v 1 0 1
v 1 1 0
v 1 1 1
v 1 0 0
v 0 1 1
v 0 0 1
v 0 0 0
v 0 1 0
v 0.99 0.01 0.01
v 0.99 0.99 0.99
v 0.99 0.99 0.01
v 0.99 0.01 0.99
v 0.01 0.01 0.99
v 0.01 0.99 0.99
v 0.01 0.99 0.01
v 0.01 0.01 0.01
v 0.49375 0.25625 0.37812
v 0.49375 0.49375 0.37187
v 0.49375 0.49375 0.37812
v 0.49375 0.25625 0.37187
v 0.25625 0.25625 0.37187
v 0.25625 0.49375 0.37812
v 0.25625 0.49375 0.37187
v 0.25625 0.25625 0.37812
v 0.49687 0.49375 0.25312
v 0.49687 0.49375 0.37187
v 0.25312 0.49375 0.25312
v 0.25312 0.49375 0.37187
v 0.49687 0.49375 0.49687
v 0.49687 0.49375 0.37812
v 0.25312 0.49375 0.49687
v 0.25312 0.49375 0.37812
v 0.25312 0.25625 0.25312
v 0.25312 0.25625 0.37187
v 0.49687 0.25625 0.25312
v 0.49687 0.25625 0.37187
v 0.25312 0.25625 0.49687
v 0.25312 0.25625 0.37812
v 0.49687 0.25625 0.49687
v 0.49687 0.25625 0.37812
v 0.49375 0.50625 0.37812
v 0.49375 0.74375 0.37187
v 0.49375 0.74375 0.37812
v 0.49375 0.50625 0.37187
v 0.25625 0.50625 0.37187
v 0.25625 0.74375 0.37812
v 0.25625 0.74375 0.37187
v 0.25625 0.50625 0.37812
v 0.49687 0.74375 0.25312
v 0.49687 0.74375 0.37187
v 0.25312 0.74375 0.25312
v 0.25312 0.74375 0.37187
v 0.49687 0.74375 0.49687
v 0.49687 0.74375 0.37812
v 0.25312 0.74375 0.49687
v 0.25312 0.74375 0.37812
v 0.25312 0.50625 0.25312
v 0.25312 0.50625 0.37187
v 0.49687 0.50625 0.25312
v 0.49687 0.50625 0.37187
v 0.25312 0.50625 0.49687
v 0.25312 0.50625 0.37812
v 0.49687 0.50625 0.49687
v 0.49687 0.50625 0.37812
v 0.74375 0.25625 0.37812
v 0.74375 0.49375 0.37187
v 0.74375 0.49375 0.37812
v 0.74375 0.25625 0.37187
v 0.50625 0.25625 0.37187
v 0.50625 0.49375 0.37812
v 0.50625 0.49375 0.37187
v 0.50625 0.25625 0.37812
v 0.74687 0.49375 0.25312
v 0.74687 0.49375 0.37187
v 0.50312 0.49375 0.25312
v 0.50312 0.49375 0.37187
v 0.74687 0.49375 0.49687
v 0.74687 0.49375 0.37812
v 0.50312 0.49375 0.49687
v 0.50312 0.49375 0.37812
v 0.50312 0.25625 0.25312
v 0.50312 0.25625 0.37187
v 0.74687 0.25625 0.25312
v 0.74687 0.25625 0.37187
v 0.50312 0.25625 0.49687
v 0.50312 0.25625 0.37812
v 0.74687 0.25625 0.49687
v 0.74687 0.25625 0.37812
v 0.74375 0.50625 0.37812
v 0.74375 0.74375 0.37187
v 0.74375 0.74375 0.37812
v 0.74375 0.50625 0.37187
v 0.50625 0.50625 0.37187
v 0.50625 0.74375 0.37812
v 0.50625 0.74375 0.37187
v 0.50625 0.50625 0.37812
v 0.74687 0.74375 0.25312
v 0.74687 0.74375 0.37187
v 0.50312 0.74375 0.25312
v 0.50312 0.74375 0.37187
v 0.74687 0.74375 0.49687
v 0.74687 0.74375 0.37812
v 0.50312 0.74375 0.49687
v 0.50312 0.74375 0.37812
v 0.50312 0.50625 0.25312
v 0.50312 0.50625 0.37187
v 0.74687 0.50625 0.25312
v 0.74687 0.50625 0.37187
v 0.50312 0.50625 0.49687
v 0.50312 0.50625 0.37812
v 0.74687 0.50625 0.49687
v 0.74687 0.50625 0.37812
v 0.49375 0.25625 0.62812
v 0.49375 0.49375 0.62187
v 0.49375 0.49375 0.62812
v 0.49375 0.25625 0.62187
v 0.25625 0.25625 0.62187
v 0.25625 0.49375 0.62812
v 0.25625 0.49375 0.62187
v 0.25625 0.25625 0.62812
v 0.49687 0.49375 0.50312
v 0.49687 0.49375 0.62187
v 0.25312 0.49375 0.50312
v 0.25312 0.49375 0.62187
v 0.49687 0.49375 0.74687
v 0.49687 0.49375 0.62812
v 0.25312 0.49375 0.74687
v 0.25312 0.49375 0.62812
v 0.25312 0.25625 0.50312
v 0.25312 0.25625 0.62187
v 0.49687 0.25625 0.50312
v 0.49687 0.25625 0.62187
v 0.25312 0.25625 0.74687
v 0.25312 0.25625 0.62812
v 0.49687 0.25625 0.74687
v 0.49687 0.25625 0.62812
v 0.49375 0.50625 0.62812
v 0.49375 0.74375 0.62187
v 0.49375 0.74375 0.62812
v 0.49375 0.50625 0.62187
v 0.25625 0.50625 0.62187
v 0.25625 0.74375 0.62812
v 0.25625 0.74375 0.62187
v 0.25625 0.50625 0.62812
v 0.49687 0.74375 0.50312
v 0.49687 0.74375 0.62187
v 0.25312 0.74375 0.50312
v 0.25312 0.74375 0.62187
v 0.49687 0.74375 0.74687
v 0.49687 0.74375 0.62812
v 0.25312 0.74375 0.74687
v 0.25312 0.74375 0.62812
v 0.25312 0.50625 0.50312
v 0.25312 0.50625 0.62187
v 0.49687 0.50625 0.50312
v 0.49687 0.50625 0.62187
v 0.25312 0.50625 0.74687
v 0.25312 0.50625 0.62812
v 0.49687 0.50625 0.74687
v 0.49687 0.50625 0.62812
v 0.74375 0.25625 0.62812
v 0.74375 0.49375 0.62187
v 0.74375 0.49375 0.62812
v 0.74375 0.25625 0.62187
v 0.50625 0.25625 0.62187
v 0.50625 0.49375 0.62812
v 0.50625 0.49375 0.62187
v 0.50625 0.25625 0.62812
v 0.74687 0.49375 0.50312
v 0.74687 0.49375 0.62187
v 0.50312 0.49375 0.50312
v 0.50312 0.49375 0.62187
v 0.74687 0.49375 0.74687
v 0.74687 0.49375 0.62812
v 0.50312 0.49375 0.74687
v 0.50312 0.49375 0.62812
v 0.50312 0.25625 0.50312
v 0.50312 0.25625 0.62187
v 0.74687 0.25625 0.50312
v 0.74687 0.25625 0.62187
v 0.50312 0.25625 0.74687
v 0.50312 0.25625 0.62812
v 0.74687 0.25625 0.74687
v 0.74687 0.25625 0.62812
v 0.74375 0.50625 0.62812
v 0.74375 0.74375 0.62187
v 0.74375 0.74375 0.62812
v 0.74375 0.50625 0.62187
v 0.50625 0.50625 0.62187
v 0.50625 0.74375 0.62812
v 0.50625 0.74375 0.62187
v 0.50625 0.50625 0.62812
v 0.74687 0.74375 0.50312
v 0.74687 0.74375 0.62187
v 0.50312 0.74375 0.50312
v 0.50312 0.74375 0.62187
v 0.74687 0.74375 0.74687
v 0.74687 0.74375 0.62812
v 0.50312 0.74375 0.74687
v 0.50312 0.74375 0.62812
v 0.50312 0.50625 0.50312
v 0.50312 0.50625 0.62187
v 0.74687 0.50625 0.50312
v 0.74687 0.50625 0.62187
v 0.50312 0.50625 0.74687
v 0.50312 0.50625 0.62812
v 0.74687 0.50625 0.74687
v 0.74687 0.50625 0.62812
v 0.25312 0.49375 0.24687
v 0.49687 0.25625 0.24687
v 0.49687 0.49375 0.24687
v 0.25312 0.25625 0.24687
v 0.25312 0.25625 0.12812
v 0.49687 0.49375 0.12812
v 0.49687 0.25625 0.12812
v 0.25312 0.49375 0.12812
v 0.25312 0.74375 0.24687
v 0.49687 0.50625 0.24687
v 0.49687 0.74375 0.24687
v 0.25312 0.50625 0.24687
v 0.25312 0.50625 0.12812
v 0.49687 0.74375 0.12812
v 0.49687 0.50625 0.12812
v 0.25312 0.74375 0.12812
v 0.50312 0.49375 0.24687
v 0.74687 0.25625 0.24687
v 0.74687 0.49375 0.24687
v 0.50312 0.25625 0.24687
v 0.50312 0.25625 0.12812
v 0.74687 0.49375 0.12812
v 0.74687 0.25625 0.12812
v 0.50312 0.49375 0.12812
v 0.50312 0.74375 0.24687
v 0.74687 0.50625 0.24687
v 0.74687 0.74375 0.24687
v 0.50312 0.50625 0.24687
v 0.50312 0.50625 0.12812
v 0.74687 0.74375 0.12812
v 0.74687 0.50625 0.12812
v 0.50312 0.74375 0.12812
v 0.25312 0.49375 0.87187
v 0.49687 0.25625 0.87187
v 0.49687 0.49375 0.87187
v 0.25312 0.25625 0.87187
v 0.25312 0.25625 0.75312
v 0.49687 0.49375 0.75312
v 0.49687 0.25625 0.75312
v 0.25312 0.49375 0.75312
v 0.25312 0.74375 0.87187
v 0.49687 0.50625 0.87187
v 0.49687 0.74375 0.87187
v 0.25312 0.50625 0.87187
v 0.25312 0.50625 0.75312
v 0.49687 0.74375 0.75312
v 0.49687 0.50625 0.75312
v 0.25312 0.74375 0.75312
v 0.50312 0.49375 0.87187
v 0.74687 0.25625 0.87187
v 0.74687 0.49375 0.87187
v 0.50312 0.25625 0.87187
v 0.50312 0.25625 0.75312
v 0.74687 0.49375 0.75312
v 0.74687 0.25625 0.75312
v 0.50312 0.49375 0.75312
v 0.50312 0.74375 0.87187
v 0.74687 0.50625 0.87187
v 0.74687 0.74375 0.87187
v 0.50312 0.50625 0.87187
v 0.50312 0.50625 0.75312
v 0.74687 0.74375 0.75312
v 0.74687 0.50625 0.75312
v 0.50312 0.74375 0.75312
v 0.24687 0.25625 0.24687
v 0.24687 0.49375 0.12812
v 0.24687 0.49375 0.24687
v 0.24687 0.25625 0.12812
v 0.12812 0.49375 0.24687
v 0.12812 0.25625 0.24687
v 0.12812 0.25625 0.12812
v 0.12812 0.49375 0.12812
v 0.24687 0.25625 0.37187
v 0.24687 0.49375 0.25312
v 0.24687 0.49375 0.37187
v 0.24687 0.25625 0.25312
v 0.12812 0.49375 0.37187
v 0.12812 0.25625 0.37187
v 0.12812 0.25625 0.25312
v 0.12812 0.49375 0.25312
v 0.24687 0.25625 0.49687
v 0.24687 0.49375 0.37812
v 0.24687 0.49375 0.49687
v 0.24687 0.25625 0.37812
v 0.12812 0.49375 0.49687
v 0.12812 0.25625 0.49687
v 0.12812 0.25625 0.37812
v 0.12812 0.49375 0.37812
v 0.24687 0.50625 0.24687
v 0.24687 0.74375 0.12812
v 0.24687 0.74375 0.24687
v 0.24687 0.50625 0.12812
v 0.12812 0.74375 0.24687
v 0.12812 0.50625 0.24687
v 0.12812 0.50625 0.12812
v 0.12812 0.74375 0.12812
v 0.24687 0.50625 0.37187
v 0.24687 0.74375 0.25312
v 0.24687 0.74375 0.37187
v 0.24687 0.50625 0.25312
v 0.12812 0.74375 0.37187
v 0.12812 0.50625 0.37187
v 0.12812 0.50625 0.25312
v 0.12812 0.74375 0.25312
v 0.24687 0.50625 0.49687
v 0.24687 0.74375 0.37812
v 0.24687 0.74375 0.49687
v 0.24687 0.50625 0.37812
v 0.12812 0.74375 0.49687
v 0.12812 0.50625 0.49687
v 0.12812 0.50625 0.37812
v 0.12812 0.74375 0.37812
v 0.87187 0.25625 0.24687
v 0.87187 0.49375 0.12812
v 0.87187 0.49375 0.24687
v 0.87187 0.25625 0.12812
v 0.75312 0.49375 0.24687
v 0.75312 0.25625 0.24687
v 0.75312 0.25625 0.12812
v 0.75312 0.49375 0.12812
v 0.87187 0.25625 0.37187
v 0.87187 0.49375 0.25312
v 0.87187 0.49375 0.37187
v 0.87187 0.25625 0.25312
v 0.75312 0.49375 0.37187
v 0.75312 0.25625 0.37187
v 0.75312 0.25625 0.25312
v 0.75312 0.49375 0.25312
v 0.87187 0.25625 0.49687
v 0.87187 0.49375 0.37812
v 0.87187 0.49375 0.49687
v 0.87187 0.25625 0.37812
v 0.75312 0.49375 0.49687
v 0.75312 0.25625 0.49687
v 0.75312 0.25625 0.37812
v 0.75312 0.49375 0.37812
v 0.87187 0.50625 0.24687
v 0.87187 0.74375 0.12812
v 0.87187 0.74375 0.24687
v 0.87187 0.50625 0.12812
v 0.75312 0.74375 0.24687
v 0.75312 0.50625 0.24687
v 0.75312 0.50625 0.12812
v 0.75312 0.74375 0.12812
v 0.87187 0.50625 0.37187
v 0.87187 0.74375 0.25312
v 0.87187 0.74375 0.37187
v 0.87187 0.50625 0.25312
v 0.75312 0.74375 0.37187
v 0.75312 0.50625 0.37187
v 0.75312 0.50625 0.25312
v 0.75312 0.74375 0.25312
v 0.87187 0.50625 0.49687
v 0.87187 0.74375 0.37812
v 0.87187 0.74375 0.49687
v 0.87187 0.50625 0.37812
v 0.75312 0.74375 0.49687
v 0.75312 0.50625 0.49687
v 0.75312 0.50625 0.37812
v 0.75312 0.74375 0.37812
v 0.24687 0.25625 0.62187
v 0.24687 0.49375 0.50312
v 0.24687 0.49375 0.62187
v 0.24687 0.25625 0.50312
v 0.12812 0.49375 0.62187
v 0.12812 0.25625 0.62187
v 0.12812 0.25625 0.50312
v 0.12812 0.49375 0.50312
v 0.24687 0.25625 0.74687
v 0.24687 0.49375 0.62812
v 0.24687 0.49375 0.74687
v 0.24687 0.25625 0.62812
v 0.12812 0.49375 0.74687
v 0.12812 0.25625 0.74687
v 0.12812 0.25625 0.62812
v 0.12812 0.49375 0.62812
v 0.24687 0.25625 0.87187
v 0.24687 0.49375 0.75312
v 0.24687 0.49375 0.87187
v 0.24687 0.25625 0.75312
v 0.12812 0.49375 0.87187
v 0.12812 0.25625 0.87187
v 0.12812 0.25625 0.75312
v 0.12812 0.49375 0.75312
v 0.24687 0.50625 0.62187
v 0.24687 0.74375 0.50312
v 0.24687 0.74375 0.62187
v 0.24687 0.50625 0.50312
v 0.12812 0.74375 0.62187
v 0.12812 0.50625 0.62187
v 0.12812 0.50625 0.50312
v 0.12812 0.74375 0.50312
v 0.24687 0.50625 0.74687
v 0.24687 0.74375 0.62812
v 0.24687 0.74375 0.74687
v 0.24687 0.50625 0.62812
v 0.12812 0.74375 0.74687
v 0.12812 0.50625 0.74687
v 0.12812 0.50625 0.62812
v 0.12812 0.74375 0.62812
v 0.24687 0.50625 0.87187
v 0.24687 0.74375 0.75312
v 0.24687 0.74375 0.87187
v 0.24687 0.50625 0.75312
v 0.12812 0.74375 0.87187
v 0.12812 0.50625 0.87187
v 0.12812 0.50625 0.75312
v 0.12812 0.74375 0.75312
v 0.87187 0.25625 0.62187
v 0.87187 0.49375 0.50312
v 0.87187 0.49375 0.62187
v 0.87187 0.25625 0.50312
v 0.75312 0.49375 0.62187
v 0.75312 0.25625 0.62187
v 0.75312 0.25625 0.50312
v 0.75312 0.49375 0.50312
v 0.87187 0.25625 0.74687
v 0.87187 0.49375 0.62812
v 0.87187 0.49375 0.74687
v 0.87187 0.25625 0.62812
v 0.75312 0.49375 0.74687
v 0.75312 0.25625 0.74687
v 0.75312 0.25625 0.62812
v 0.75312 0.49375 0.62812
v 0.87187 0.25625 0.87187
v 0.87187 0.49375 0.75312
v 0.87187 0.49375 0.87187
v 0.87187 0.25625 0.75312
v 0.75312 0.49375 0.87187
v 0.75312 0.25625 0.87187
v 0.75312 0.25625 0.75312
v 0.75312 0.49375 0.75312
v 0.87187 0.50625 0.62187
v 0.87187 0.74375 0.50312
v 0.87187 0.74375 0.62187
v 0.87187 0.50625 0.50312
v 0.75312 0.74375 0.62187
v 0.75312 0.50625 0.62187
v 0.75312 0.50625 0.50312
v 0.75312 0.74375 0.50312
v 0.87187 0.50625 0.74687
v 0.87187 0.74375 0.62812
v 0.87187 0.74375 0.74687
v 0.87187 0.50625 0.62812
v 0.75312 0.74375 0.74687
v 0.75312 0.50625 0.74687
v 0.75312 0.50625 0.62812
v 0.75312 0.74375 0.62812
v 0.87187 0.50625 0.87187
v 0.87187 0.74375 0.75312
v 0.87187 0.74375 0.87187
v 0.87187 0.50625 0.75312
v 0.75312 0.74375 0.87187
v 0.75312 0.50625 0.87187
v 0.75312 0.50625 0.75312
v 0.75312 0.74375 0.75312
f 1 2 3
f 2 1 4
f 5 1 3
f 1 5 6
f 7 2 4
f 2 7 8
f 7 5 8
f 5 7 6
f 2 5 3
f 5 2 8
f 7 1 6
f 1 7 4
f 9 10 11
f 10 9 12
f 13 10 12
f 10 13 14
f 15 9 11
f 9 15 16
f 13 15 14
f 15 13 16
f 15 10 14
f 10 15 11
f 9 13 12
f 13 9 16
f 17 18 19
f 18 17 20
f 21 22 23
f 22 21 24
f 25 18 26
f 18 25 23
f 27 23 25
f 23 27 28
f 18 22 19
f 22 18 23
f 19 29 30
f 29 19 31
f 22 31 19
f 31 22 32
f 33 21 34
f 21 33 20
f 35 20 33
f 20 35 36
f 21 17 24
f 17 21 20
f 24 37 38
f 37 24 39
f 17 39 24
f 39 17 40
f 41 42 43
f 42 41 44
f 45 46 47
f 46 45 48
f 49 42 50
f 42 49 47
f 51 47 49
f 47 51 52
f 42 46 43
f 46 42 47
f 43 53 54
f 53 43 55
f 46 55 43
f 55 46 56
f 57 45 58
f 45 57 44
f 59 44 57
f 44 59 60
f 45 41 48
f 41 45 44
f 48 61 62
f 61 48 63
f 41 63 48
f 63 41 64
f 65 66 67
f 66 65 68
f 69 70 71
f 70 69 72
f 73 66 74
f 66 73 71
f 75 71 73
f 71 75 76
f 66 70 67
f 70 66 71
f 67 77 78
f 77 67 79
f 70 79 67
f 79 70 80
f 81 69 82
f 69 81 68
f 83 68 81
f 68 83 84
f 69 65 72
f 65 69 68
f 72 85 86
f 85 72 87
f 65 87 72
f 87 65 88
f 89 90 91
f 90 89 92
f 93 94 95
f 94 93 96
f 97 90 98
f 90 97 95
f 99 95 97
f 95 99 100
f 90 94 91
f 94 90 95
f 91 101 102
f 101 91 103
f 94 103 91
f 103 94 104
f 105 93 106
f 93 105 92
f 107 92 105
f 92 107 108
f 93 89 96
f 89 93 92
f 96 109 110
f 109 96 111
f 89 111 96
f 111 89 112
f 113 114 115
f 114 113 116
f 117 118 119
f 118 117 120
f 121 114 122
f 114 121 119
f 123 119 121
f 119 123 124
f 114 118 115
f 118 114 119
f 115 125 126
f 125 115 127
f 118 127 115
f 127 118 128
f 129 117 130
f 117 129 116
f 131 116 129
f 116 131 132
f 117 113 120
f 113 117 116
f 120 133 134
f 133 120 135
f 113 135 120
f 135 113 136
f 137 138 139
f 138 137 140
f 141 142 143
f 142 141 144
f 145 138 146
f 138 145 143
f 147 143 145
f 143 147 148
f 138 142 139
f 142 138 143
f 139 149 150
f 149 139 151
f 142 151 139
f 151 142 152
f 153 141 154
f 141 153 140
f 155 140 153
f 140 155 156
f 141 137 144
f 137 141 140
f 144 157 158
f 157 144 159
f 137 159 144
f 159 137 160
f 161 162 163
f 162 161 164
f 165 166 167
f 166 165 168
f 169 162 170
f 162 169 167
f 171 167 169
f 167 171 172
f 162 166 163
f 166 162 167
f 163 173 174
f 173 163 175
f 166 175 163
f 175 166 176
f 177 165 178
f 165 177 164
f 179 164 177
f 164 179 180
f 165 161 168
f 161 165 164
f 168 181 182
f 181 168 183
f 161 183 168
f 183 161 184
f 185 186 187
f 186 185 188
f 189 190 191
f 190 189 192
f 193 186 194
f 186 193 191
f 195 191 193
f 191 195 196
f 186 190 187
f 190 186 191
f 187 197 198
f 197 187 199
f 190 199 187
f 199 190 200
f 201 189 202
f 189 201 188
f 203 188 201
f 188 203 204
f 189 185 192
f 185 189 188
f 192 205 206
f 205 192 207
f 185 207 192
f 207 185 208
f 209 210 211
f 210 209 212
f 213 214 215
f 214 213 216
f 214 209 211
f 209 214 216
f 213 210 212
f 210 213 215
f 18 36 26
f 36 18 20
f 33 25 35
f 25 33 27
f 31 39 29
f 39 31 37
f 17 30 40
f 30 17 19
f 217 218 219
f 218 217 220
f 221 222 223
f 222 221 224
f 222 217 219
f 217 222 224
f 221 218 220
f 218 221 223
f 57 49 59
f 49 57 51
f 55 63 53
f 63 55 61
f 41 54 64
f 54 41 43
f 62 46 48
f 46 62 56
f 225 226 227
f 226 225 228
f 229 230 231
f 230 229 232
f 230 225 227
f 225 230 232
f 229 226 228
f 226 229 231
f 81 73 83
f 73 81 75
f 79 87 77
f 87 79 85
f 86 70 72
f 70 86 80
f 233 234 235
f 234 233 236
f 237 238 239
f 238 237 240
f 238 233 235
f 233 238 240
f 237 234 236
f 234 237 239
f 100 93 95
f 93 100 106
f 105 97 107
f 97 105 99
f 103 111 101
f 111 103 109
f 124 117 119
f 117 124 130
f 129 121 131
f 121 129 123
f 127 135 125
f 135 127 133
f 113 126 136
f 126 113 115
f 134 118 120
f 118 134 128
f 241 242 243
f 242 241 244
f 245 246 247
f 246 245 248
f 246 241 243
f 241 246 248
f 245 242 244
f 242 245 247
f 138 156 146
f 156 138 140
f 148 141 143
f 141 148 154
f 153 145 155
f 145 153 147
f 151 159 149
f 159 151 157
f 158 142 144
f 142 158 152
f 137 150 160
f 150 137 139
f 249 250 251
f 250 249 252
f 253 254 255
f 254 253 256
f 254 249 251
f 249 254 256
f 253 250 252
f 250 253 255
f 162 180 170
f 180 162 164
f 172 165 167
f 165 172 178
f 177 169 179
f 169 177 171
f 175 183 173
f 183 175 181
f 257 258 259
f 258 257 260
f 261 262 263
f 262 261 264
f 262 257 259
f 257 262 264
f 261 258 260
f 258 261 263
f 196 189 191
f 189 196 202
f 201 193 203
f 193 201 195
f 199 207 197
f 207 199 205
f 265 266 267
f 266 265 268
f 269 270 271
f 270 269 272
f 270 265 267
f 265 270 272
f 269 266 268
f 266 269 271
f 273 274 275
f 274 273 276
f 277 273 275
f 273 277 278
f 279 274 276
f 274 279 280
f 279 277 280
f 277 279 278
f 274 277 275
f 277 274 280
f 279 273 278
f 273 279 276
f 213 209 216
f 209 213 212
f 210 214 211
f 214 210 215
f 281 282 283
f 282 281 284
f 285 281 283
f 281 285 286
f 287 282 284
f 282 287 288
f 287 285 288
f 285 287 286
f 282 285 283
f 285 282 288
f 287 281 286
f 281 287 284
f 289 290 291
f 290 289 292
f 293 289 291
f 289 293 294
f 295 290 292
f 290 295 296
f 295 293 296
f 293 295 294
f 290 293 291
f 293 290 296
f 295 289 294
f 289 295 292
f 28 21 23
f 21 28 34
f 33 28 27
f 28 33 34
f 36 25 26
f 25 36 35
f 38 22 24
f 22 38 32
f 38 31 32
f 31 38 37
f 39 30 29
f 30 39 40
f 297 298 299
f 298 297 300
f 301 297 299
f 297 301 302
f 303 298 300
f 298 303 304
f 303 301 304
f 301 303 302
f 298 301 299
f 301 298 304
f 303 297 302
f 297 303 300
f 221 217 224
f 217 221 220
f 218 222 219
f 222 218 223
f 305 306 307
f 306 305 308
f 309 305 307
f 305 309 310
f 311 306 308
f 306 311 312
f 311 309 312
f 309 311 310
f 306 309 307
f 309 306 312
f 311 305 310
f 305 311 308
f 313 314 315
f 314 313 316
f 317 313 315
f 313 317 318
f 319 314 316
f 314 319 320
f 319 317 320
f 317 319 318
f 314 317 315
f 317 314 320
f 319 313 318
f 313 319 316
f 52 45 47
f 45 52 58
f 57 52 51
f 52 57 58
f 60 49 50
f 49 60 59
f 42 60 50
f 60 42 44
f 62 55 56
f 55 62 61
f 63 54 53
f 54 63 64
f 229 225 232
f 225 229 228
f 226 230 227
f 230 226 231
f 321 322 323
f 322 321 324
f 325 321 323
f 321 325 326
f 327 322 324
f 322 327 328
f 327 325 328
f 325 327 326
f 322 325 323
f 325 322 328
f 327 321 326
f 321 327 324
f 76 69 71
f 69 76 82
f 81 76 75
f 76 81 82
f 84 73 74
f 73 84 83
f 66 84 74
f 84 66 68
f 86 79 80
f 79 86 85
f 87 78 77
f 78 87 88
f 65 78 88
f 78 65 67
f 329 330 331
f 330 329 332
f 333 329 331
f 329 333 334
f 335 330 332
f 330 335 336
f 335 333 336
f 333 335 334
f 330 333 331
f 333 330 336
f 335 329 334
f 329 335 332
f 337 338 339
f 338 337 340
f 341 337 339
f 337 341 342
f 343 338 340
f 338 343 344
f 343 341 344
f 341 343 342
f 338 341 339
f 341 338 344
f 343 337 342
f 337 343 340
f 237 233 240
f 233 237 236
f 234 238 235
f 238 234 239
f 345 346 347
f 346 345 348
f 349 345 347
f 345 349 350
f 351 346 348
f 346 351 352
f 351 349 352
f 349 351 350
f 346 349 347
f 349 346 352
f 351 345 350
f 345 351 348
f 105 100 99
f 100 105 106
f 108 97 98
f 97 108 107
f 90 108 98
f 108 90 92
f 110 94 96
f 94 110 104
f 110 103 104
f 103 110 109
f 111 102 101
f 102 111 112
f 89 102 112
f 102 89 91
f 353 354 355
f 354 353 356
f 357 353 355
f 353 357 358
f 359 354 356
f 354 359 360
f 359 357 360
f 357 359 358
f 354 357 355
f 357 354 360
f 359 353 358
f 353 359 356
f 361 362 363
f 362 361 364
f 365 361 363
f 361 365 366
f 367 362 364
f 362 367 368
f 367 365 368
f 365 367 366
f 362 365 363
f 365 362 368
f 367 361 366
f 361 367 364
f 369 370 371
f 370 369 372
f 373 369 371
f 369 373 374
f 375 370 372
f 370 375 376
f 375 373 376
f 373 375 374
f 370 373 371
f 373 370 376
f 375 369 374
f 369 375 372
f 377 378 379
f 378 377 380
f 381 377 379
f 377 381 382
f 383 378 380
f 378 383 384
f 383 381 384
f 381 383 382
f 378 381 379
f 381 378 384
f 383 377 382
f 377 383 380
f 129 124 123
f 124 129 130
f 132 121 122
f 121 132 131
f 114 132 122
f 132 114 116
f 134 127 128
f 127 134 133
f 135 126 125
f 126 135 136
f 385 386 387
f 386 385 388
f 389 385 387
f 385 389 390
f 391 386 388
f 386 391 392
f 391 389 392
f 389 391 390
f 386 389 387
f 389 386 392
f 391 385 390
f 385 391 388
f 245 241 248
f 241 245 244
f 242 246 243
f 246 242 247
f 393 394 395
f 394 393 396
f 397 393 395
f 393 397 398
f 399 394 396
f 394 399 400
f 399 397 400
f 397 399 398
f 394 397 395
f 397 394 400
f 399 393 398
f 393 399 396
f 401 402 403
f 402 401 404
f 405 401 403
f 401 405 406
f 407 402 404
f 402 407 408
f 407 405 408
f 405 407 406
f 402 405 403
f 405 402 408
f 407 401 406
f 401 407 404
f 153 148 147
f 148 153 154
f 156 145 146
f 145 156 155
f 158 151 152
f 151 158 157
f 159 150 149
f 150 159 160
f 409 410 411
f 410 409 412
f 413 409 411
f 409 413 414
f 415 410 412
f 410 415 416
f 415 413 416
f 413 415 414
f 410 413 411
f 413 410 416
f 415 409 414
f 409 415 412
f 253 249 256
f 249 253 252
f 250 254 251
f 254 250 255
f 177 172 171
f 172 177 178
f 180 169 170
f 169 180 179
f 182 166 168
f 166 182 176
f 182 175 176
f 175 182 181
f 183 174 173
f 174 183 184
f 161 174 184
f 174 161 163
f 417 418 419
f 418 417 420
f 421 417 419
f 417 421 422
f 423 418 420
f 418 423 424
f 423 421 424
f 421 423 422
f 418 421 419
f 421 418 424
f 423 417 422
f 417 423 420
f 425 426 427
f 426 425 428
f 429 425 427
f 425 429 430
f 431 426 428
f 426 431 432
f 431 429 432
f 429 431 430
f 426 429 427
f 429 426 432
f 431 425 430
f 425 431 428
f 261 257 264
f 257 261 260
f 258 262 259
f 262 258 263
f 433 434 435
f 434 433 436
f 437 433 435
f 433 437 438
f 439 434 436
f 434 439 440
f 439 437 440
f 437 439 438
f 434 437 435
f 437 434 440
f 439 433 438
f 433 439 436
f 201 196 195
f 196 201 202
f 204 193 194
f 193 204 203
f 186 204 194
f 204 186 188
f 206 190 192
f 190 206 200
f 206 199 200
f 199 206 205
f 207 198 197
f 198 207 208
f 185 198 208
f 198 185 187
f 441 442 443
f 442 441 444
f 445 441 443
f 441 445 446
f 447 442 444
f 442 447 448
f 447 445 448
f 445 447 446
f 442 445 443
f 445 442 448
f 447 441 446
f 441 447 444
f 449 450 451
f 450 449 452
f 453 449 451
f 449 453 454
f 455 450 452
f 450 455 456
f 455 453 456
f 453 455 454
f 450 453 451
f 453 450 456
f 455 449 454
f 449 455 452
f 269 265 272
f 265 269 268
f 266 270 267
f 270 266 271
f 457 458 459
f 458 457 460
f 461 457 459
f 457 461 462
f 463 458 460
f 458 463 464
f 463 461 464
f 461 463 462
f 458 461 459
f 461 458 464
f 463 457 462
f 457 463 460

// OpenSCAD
translate([0.375, 0.375, 0.375]) color([0.3883199692345365, 0.7869162106930458, 0.23899702062311146]) cube([0.2375, 0.2375, 0.2375], center=true);
translate([0.375, 0.625, 0.375]) color([0.2176274796857205, 0.7110061486176577, 0.25004677614868753]) cube([0.2375, 0.2375, 0.2375], center=true);
translate([0.625, 0.375, 0.375]) color([0.8827708295986066, 0.4788327404320506, 0.9618843449275044]) cube([0.2375, 0.2375, 0.2375], center=true);
translate([0.625, 0.625, 0.375]) color([0.9742368684963271, 0.36045008336821716, 0.3129447861090856]) cube([0.2375, 0.2375, 0.2375], center=true);
translate([0.375, 0.375, 0.625]) color([0.2023226874632732, 0.38215652118132193, 0.1556265853305826]) cube([0.2375, 0.2375, 0.2375], center=true);
translate([0.375, 0.625, 0.625]) color([0.4717102388711689, 0.23609477164521653, 0.7306291976925312]) cube([0.2375, 0.2375, 0.2375], center=true);
translate([0.625, 0.375, 0.625]) color([0.7439379658632048, 0.4364001243701936, 0.44323639739158904]) cube([0.2375, 0.2375, 0.2375], center=true);
translate([0.625, 0.625, 0.625]) color([0.8514931681733601, 0.36213661336467284, 0.3568051329536944]) cube([0.2375, 0.2375, 0.2375], center=true);
translate([0.375, 0.375, 0.1875]) color([0.47800662991113696, 0.4876037469032438, 0.8499232037124018]) cube([0.2375, 0.2375, 0.11875], center=true);
translate([0.375, 0.375, 0.3125]) color([0.17862328679042605, 0.6831862692395634, 0.3242380213904731]) cube([0.2375, 0.2375, 0.11875], center=true);
translate([0.375, 0.375, 0.4375]) color([0.9732609929963622, 0.4588825241570119, 0.9104252857630646]) cube([0.2375, 0.2375, 0.11875], center=true);
translate([0.375, 0.625, 0.1875]) color([0.5208492011207246, 0.2175610006380564, 0.4182467620806456]) cube([0.2375, 0.2375, 0.11875], center=true);
translate([0.375, 0.625, 0.3125]) color([0.10367272636821301, 0.28270530471345523, 0.9580749862330331]) cube([0.2375, 0.2375, 0.11875], center=true);
translate([0.375, 0.625, 0.4375]) color([0.835309931021156, 0.7408114004189117, 0.007113458608317802]) cube([0.2375, 0.2375, 0.11875], center=true);
translate([0.625, 0.375, 0.1875]) color([0.06633495667732858, 0.10390224873898213, 0.07826086552813027]) cube([0.2375, 0.2375, 0.11875], center=true);
translate([0.625, 0.375, 0.3125]) color([0.27857613203872333, 0.08693062655095518, 0.8111422389137108]) cube([0.2375, 0.2375, 0.11875], center=true);
translate([0.625, 0.375, 0.4375]) color([0.015754895383787382, 0.9230210115477374, 0.6311692344289677]) cube([0.2375, 0.2375, 0.11875], center=true);
translate([0.625, 0.625, 0.1875]) color([0.09529602932109271, 0.8316576365971805, 0.16255824629592963]) cube([0.2375, 0.2375, 0.11875], center=true);
translate([0.625, 0.625, 0.3125]) color([0.537631077646444, 0.10369630687054932, 0.39941485730800597]) cube([0.2375, 0.2375, 0.11875], center=true);
translate([0.625, 0.625, 0.4375]) color([0.03167078511608701, 0.1299046712394163, 0.9664289868493634]) cube([0.2375, 0.2375, 0.11875], center=true);
translate([0.375, 0.375, 0.5625]) color([0.9577157575369346, 0.6717939584125148, 0.8077065870150837]) cube([0.2375, 0.2375, 0.11875], center=true);
translate([0.375, 0.375, 0.6875]) color([0.8391823855105408, 0.5662418331704699, 0.8483457495897468]) cube([0.2375, 0.2375, 0.11875], center=true);
translate([0.375, 0.375, 0.8125]) color([0.0907492855022386, 0.172381478036309, 0.2945048518552693]) cube([0.2375, 0.2375, 0.11875], center=true);
translate([0.375, 0.625, 0.5625]) color([0.5674771832327852, 0.7390617236796915, 0.6077812129609614]) cube([0.2375, 0.2375, 0.11875], center=true);
translate([0.375, 0.625, 0.6875]) color([0.8356343496999468, 0.6494934907054305, 0.32572038127985237]) cube([0.2375, 0.2375, 0.11875], center=true);
translate([0.375, 0.625, 0.8125]) color([0.40812215631186877, 0.24859251190541864, 0.6011744075270763]) cube([0.2375, 0.2375, 0.11875], center=true);
translate([0.625, 0.375, 0.5625]) color([0.51549245846849, 0.8798114652006801, 0.6362562723178095]) cube([0.2375, 0.2375, 0.11875], center=true);
translate([0.625, 0.375, 0.6875]) color([0.22500872519212534, 0.8579768717980989, 0.9914878316344947]) cube([0.2375, 0.2375, 0.11875], center=true);
translate([0.625, 0.375, 0.8125]) color([0.2800132939500575, 0.044333538529565675, 0.6998959533990192]) cube([0.2375, 0.2375, 0.11875], center=true);
translate([0.625, 0.625, 0.5625]) color([0.06021544158230252, 0.6698110432076612, 0.31920077197402785]) cube([0.2375, 0.2375, 0.11875], center=true);
translate([0.625, 0.625, 0.6875]) color([0.7627469924397148, 0.7995810714402417, 0.6049986152668421]) cube([0.2375, 0.2375, 0.11875], center=true);
translate([0.625, 0.625, 0.8125]) color([0.9944822642742176, 0.1058654446206696, 0.056020355042062375]) cube([0.2375, 0.2375, 0.11875], center=true);
translate([0.1875, 0.375, 0.1875]) color([0.49880375865628845, 0.43225897139594716, 0.9734902523308799]) cube([0.11875, 0.2375, 0.11875], center=true);
translate([0.3125, 0.375, 0.1875]) color([0.7242045921089734, 0.5461752890347371, 0.8733918912661065]) cube([0.11875, 0.2375, 0.11875], center=true);
translate([0.4375, 0.375, 0.1875]) color([0.4858700118247665, 0.6885313298898925, 0.2841989857772992]) cube([0.11875, 0.2375, 0.11875], center=true);
translate([0.1875, 0.375, 0.3125]) color([0.28303657398954307, 0.33896477045730966, 0.8267486659477957]) cube([0.11875, 0.2375, 0.11875], center=true);
translate([0.1875, 0.375, 0.4375]) color([0.3660198570459987, 0.7056816781640568, 0.9324040923575997]) cube([0.11875, 0.2375, 0.11875], center=true);
translate([0.3125, 0.375, 0.3125]) color([0.008434062962213273, 0.25966641838531823, 0.9896839070709093]) cube([0.11875, 0.2375, 0.11875], center=true);
translate([0.4375, 0.375, 0.3125]) color([0.3562276120347111, 0.549163440597015, 0.7345698528172236]) cube([0.11875, 0.2375, 0.11875], center=true);
translate([0.3125, 0.375, 0.4375]) color([0.732045961898085, 0.19701154166892942, 0.5962982456152792]) cube([0.11875, 0.2375, 0.11875], center=true);
translate([0.4375, 0.375, 0.4375]) color([0.1709070674712161, 0.23454120539559253, 0.05965731709382249]) cube([0.11875, 0.2375, 0.11875], center=true);
translate([0.1875, 0.625, 0.1875]) color([0.17047423752658786, 0.23075793389222676, 0.6940455646097671]) cube([0.11875, 0.2375, 0.11875], center=true);
translate([0.3125, 0.625, 0.1875]) color([0.8481841538990768, 0.13634263953347525, 0.7137514688917184]) cube([0.11875, 0.2375, 0.11875], center=true);
translate([0.4375, 0.625, 0.1875]) color([0.7915372654523524, 0.7173638361453191, 0.14113186486053086]) cube([0.11875, 0.2375, 0.11875], center=true);
translate([0.1875, 0.625, 0.3125]) color([0.9711271602020061, 0.9890646201983848, 0.4964262388032783]) cube([0.11875, 0.2375, 0.11875], center=true);
translate([0.1875, 0.625, 0.4375]) color([0.40560682779903534, 0.3835746799207883, 0.1557493039145309]) cube([0.11875, 0.2375, 0.11875], center=true);
translate([0.3125, 0.625, 0.3125]) color([0.4933469414752878, 0.6570500580354268, 0.5899389624581904]) cube([0.11875, 0.2375, 0.11875], center=true);
translate([0.4375, 0.625, 0.3125]) color([0.6139668623051788, 0.5262061554889748, 0.0034400991512434365]) cube([0.11875, 0.2375, 0.11875], center=true);
translate([0.3125, 0.625, 0.4375]) color([0.07191327268176329, 0.7373098757098631, 0.659559735300607]) cube([0.11875, 0.2375, 0.11875], center=true);
translate([0.4375, 0.625, 0.4375]) color([0.4200116183741045, 0.8263336350230984, 0.6593583822755242]) cube([0.11875, 0.2375, 0.11875], center=true);
translate([0.5625, 0.375, 0.1875]) color([0.8288407233455249, 0.6515819105126321, 0.4593362964879698]) cube([0.11875, 0.2375, 0.11875], center=true);
translate([0.6875, 0.375, 0.1875]) color([0.4591092239540787, 0.1713522842781381, 0.561934915837864]) cube([0.11875, 0.2375, 0.11875], center=true);
translate([0.8125, 0.375, 0.1875]) color([0.1799598830325384, 0.44274893035079277, 0.4917410727565138]) cube([0.11875, 0.2375, 0.11875], center=true);
translate([0.5625, 0.375, 0.3125]) color([0.11020327241408323, 0.38543118717556824, 0.0479535039356318]) cube([0.11875, 0.2375, 0.11875], center=true);
translate([0.6875, 0.375, 0.3125]) color([0.341433194175218, 0.2915115974480976, 0.7314015574307117]) cube([0.11875, 0.2375, 0.11875], center=true);
translate([0.5625, 0.375, 0.4375]) color([0.7391024712281217, 0.9232509311800161, 0.29827489404897667]) cube([0.11875, 0.2375, 0.11875], center=true);
translate([0.6875, 0.375, 0.4375]) color([0.41431412493129416, 0.6589299917840314, 0.798179972946809]) cube([0.11875, 0.2375, 0.11875], center=true);
translate([0.8125, 0.375, 0.3125]) color([0.2535685448838644, 0.493771769516103, 0.6674609623229374]) cube([0.11875, 0.2375, 0.11875], center=true);
translate([0.8125, 0.375, 0.4375]) color([0.9670048585468828, 0.6595385818639548, 0.7865734396584008]) cube([0.11875, 0.2375, 0.11875], center=true);
translate([0.5625, 0.625, 0.1875]) color([0.6957763518825482, 0.6867777422990544, 0.005344872058621997]) cube([0.11875, 0.2375, 0.11875], center=true);
translate([0.6875, 0.625, 0.1875]) color([0.33539130141413687, 0.5767121640197164, 0.5087745732193919]) cube([0.11875, 0.2375, 0.11875], center=true);
translate([0.8125, 0.625, 0.1875]) color([0.30965707574325263, 0.6917970815900459, 0.8631305255509821]) cube([0.11875, 0.2375, 0.11875], center=true);
translate([0.5625, 0.625, 0.3125]) color([0.8725495227719138, 0.7142271781644793, 0.796872527890394]) cube([0.11875, 0.2375, 0.11875], center=true);
translate([0.6875, 0.625, 0.3125]) color([0.5783783852497906, 0.5839194189039768, 0.9652775158798517]) cube([0.11875, 0.2375, 0.11875], center=true);
translate([0.5625, 0.625, 0.4375]) color([0.29189535806731537, 0.8966792681051832, 0.11824000749685071]) cube([0.11875, 0.2375, 0.11875], center=true);
translate([0.6875, 0.625, 0.4375]) color([0.8637142940163804, 0.7695910852642079, 0.8427710415748523]) cube([0.11875, 0.2375, 0.11875], center=true);
translate([0.8125, 0.625, 0.3125]) color([0.48316969209272775, 0.5680479517472711, 0.5993386836426161]) cube([0.11875, 0.2375, 0.11875], center=true);
translate([0.8125, 0.625, 0.4375]) color([0.1882427063418558, 0.27778399624159733, 0.6124989343866036]) cube([0.11875, 0.2375, 0.11875], center=true);
translate([0.1875, 0.375, 0.5625]) color([0.4914332354783163, 0.9390975110789499, 0.07962727046990137]) cube([0.11875, 0.2375, 0.11875], center=true);
translate([0.1875, 0.375, 0.6875]) color([0.9704122280561527, 0.9999483403016054, 0.4943459673355416]) cube([0.11875, 0.2375, 0.11875], center=true);
translate([0.3125, 0.375, 0.5625]) color([0.42631824596494894, 0.9653658063249968, 0.9110713820637681]) cube([0.11875, 0.2375, 0.11875], center=true);
translate([0.4375, 0.375, 0.5625]) color([0.16551396571637667, 0.5660041884582874, 0.6257391540684205]) cube([0.11875, 0.2375, 0.11875], center=true);
translate([0.3125, 0.375, 0.6875]) color([0.28910861712680724, 0.5593061678808607, 0.817014645221563]) cube([0.11875, 0.2375, 0.11875], center=true);
translate([0.4375, 0.375, 0.6875]) color([0.7536305506613064, 0.8563181155996293, 0.25729870951725065]) cube([0.11875, 0.2375, 0.11875], center=true);
translate([0.1875, 0.375, 0.8125]) color([0.43076621487008626, 0.42707647299278473, 0.8649192100044286]) cube([0.11875, 0.2375, 0.11875], center=true);
translate([0.3125, 0.375, 0.8125]) color([0.08291416362192194, 0.3247489987944149, 0.8645739134761347]) cube([0.11875, 0.2375, 0.11875], center=true);
translate([0.4375, 0.375, 0.8125]) color([0.32724810590646414, 0.6710730865537465, 0.373996896045544]) cube([0.11875, 0.2375, 0.11875], center=true);
translate([0.1875, 0.625, 0.5625]) color([0.7097578447123706, 0.2066732296972369, 0.6326817187050872]) cube([0.11875, 0.2375, 0.11875], center=true);
translate([0.1875, 0.625, 0.6875]) color([0.06387355445381926, 0.763494652679214, 0.947368810100721]) cube([0.11875, 0.2375, 0.11875], center=true);
translate([0.3125, 0.625, 0.5625]) color([0.4165084178595032, 0.02006719688799774, 0.9257217048656714]) cube([0.11875, 0.2375, 0.11875], center=true);
translate([0.4375, 0.625, 0.5625]) color([0.3321438671726613, 0.3379060364065327, 0.9982483638156507]) cube([0.11875, 0.2375, 0.11875], center=true);
translate([0.3125, 0.625, 0.6875]) color([0.1453584638074764, 0.12920987005878992, 0.870170920815784]) cube([0.11875, 0.2375, 0.11875], center=true);
translate([0.4375, 0.625, 0.6875]) color([0.00750678200349475, 0.5776369494108068, 0.205610061691759]) cube([0.11875, 0.2375, 0.11875], center=true);
translate([0.1875, 0.625, 0.8125]) color([0.8261456732233415, 0.4741397192473049, 0.4425489942790295]) cube([0.11875, 0.2375, 0.11875], center=true);
translate([0.3125, 0.625, 0.8125]) color([0.8155831137682892, 0.32499437896271755, 0.8914771123303454]) cube([0.11875, 0.2375, 0.11875], center=true);
translate([0.4375, 0.625, 0.8125]) color([0.26417708466113565, 0.4437430056875623, 0.7424544254146126]) cube([0.11875, 0.2375, 0.11875], center=true);
translate([0.5625, 0.375, 0.5625]) color([0.4691923385691058, 0.06835799997756464, 0.8207024333383169]) cube([0.11875, 0.2375, 0.11875], center=true);
translate([0.6875, 0.375, 0.5625]) color([0.8865387738092997, 0.5703598513083031, 0.7510713500259403]) cube([0.11875, 0.2375, 0.11875], center=true);
translate([0.5625, 0.375, 0.6875]) color([0.709737752714622, 0.04199018964261203, 0.4060503935705506]) cube([0.11875, 0.2375, 0.11875], center=true);
translate([0.6875, 0.375, 0.6875]) color([0.32886530608880926, 0.006570444729849689, 0.6723424552856119]) cube([0.11875, 0.2375, 0.11875], center=true);
translate([0.8125, 0.375, 0.5625]) color([0.1007122640692929, 0.8950215887604244, 0.1586920886411135]) cube([0.11875, 0.2375, 0.11875], center=true);
translate([0.8125, 0.375, 0.6875]) color([0.36018141331019715, 0.7280060045016593, 0.08307036302027981]) cube([0.11875, 0.2375, 0.11875], center=true);
translate([0.5625, 0.375, 0.8125]) color([0.2807514290253651, 0.4658344822900672, 0.31582043082142386]) cube([0.11875, 0.2375, 0.11875], center=true);
translate([0.6875, 0.375, 0.8125]) color([0.4666935447581938, 0.13306000917664595, 0.24762028529699898]) cube([0.11875, 0.2375, 0.11875], center=true);
translate([0.8125, 0.375, 0.8125]) color([0.8909519007065, 0.08823121130166611, 0.5963821438386095]) cube([0.11875, 0.2375, 0.11875], center=true);
translate([0.5625, 0.625, 0.5625]) color([0.1974895854956732, 0.8478672309238493, 0.17971128576132223]) cube([0.11875, 0.2375, 0.11875], center=true);
translate([0.6875, 0.625, 0.5625]) color([0.2868374069611709, 0.6515822591755716, 0.37477867054500924]) cube([0.11875, 0.2375, 0.11875], center=true);
translate([0.5625, 0.625, 0.6875]) color([0.029090133873378998, 0.6396387652475751, 0.3736380623730282]) cube([0.11875, 0.2375, 0.11875], center=true);
translate([0.6875, 0.625, 0.6875]) color([0.765217968593816, 0.9856172760294208, 0.3984737588374091]) cube([0.11875, 0.2375, 0.11875], center=true);
translate([0.8125, 0.625, 0.5625]) color([0.577724519507403, 0.506330900046305, 0.26183882998553776]) cube([0.11875, 0.2375, 0.11875], center=true);
translate([0.8125, 0.625, 0.6875]) color([0.5847103648233685, 0.8620790917642257, 0.722215945322207]) cube([0.11875, 0.2375, 0.11875], center=true);
translate([0.5625, 0.625, 0.8125]) color([0.3819501547108064, 0.9220691461180129, 0.2520722880439882]) cube([0.11875, 0.2375, 0.11875], center=true);
translate([0.6875, 0.625, 0.8125]) color([0.848000126227578, 0.14047049047542115, 0.4750104164801411]) cube([0.11875, 0.2375, 0.11875], center=true);
translate([0.8125, 0.625, 0.8125]) color([0.47122426882148716, 0.8546205104861277, 0.03955834092967403]) cube([0.11875, 0.2375, 0.11875], center=true);
color([0.3,0.3,0.3,0.3]) difference() { cube([1,1,1]); translate([0.01,0.01,0.01]) cube([0.98,0.98,0.98]); }
